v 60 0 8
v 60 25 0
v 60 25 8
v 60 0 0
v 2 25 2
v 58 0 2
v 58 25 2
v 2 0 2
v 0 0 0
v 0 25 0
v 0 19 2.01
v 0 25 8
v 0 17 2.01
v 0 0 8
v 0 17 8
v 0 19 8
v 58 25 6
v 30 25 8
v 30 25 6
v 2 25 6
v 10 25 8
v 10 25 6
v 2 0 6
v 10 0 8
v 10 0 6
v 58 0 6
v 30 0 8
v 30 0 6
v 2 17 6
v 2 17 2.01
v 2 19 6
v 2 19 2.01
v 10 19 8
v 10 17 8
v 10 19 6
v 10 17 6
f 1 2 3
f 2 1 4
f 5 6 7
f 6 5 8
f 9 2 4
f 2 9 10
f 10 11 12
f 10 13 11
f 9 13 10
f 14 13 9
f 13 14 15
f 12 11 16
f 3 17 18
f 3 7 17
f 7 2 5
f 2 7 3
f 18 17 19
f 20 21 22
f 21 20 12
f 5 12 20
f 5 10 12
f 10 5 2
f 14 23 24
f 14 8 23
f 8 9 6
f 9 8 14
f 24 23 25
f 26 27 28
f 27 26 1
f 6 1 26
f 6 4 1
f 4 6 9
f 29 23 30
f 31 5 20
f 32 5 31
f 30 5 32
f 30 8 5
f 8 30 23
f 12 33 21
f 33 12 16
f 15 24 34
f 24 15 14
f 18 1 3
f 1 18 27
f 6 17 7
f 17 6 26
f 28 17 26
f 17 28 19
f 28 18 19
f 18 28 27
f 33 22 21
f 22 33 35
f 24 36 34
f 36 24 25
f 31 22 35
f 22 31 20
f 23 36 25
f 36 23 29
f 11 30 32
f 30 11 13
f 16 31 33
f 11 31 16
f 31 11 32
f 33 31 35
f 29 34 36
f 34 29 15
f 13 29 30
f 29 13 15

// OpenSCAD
$fn=32;

clip();
//cap();

module clip() {
  difference() {
    union() {
      cube([60,25,2]);
      cube([2,25,8]);
      translate([58,0,0]) cube([2,25,8]);
      
      translate([30,0,6]) cube([30,25,2]);
      translate([0,0,6]) cube([10,25,2]);
    }  
    
    
    translate([-1,25-8,2.01]) cube([20,2,10]);
  }
}

module cap() {
  
  difference() {
    translate([-2.5,-.98,0]) cube([5,1.96,2]);
    translate([0,0.01,0.5]) cylinder(r=1,h=2);
  }
}
